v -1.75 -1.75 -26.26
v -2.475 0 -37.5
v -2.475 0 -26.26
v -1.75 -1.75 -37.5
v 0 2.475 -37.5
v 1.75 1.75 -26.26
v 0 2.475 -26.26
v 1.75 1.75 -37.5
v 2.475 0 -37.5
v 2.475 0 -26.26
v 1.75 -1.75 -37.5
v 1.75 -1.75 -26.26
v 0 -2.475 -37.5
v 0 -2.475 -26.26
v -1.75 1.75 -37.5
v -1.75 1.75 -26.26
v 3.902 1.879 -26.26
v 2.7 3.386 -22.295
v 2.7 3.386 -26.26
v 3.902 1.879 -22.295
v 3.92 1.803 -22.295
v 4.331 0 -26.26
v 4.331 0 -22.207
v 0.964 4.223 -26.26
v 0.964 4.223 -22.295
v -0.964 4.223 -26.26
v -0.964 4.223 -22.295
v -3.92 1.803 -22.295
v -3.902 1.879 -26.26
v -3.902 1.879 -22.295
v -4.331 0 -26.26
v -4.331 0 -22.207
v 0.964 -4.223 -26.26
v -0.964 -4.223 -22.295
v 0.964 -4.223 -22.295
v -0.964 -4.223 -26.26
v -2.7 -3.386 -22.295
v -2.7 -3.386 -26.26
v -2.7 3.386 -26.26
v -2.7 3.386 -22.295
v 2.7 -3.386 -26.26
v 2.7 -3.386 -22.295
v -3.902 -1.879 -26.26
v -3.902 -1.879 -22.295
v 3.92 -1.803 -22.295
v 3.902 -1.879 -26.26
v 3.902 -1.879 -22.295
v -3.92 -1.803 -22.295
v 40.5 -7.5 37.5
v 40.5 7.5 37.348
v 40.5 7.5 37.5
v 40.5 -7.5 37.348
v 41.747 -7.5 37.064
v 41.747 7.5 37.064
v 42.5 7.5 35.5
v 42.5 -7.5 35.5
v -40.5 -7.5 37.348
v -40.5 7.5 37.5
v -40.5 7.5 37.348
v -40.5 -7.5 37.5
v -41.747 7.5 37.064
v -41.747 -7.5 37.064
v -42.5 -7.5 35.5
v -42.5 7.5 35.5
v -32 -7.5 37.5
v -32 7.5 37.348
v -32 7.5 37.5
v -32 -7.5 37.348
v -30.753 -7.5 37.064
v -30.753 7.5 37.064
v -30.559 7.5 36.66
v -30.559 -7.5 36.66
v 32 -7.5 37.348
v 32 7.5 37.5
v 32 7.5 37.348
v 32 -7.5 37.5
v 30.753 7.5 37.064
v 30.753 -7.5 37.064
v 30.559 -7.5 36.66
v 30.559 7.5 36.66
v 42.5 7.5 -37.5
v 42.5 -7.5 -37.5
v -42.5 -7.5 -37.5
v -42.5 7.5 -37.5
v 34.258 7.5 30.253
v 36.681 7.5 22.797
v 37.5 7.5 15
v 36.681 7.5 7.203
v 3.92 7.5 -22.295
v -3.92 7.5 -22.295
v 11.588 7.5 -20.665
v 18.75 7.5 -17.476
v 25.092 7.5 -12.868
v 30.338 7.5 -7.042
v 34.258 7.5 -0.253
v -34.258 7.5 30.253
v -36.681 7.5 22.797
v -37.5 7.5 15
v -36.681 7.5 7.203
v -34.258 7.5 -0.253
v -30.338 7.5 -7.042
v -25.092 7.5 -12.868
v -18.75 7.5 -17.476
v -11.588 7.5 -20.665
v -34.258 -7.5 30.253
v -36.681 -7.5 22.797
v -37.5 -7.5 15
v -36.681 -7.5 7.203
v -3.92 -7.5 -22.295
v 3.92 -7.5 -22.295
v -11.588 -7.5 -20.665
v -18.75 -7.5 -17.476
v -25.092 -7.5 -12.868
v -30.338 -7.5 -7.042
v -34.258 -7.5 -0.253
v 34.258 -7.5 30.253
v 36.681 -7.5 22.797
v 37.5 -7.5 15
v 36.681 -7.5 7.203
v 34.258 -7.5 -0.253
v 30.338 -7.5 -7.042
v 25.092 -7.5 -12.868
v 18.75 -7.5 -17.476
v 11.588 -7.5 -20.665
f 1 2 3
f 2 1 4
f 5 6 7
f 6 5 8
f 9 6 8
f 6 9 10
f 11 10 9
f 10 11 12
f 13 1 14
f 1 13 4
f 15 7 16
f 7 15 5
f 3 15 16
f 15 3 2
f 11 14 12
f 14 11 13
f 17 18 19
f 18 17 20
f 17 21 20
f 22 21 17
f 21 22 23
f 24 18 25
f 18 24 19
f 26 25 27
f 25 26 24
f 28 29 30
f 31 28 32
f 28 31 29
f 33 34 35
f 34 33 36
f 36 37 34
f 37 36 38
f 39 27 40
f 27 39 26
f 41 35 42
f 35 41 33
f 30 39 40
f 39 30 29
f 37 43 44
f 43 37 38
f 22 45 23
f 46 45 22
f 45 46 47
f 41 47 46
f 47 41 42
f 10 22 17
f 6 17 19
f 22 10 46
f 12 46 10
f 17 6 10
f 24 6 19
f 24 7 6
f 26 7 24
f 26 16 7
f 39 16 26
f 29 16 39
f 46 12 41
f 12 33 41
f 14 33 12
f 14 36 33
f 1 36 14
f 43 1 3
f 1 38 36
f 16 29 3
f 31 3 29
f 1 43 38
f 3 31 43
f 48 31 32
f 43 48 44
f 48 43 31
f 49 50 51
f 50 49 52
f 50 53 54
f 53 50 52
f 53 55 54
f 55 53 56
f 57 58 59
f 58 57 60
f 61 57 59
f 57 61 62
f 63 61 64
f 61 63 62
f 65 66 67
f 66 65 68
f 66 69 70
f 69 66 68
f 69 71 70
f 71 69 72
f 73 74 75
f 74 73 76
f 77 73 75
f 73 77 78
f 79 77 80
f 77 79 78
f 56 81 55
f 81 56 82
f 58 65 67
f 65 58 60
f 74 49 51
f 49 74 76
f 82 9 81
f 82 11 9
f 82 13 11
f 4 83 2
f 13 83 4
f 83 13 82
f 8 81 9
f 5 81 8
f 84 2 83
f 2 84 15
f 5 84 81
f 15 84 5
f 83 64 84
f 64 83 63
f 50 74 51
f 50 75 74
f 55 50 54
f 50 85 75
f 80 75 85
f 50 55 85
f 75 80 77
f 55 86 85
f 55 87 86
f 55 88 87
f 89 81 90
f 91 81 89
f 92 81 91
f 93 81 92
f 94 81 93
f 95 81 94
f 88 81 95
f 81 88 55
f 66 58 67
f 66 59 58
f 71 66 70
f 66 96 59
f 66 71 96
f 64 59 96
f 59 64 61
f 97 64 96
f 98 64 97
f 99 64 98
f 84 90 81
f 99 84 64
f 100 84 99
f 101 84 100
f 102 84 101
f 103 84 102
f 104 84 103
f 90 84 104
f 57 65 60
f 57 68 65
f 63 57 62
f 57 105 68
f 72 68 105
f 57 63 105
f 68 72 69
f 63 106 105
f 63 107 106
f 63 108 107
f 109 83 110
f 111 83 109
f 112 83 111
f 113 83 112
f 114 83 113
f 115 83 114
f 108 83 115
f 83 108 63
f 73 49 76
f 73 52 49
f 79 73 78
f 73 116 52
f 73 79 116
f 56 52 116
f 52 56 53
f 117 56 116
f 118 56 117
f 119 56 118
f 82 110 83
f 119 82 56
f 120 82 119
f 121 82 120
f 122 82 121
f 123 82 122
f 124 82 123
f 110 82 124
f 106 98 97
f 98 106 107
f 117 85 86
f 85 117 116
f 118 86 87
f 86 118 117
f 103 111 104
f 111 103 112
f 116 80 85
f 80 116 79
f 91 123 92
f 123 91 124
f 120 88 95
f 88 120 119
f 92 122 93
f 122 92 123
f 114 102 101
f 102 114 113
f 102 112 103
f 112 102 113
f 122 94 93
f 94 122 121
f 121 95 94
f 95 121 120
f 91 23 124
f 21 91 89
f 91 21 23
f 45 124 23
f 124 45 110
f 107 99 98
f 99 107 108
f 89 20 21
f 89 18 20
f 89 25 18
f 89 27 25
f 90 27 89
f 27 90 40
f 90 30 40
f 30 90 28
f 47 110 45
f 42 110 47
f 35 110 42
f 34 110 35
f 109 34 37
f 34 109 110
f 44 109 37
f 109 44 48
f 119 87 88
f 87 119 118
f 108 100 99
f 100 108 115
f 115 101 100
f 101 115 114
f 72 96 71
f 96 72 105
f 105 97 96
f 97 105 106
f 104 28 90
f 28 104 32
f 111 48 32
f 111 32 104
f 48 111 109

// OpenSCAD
schlauch_durchmesser    = 75;

// ein paar berechnete werte ...
basis_laenge            = schlauch_durchmesser + 10;
basis_breite            = 15;
basis_hoehe             = schlauch_durchmesser;
basis_hoehen_versatz    = 15; //ausgewuerfelter wert!

 //etwas laenger damit es auch vollstaendig weg ist
schlauch_laenge         = basis_breite * 1.10;

//ist ja nicht wirklich eine schraube ... aber hier ein paar berechnete werte ...
schrauben_hoehe         = basis_hoehen_versatz;
schrauben_durchmesser   = basis_breite * 0.33;
schrauben_kopf_hoehe    = basis_hoehen_versatz * 0.50;

schraube_plazierung_z = basis_hoehe / -2 - schrauben_kopf_hoehe / 2;

module mirror_copy(v = [1, 0, 0]) {
    children();
    mirror(v) children();
}

module abrundung(radius = 1) {
    difference() {
        translate([0, - basis_breite * 1.25 / 2, 0]) {
            cube([radius * 1.25, basis_breite * 1.25 , radius * 1.25]);
        }

        rotate([90, 0, 0]) {
            cylinder(h = basis_breite * 1.50, r = radius, center = true);
        }
    }
}

difference() {
    cube([basis_laenge, basis_breite, basis_hoehe], center=true);

    translate([0, 0, basis_hoehen_versatz]) {
        rotate([90, 0, 0]) {
            cylinder(
                h = schlauch_laenge,
                d = schlauch_durchmesser,
                center = true
            );
        }
    }

    translate([0, 0, schraube_plazierung_z]) {
        union() {
            cylinder(h = schrauben_hoehe, d = schrauben_durchmesser);
            //0.01 um die bohrung etwas sauberer zu haben :)
            translate([0, 0, schrauben_hoehe - 0.01]) {
                cylinder(h = schrauben_kopf_hoehe, d = schrauben_durchmesser * 1.75);
            }
        }
    }

    //meine version von abgerundeten ecken :)
    radius = 2;
    mirror_copy([1, 0, 0]) {
        translate([basis_laenge / 2 - radius , 0, basis_hoehe / 2 - radius]) {
            abrundung(radius);
        }
    }

    mirror_copy([1, 0, 0]) {
        translate([(sqrt(pow(schlauch_durchmesser / 2, 2) - pow(basis_hoehe / 2 - basis_hoehen_versatz, 2)) + radius) * -1 , 0, basis_hoehe / 2 - radius]) {
            abrundung(2);
        }
    }
}
